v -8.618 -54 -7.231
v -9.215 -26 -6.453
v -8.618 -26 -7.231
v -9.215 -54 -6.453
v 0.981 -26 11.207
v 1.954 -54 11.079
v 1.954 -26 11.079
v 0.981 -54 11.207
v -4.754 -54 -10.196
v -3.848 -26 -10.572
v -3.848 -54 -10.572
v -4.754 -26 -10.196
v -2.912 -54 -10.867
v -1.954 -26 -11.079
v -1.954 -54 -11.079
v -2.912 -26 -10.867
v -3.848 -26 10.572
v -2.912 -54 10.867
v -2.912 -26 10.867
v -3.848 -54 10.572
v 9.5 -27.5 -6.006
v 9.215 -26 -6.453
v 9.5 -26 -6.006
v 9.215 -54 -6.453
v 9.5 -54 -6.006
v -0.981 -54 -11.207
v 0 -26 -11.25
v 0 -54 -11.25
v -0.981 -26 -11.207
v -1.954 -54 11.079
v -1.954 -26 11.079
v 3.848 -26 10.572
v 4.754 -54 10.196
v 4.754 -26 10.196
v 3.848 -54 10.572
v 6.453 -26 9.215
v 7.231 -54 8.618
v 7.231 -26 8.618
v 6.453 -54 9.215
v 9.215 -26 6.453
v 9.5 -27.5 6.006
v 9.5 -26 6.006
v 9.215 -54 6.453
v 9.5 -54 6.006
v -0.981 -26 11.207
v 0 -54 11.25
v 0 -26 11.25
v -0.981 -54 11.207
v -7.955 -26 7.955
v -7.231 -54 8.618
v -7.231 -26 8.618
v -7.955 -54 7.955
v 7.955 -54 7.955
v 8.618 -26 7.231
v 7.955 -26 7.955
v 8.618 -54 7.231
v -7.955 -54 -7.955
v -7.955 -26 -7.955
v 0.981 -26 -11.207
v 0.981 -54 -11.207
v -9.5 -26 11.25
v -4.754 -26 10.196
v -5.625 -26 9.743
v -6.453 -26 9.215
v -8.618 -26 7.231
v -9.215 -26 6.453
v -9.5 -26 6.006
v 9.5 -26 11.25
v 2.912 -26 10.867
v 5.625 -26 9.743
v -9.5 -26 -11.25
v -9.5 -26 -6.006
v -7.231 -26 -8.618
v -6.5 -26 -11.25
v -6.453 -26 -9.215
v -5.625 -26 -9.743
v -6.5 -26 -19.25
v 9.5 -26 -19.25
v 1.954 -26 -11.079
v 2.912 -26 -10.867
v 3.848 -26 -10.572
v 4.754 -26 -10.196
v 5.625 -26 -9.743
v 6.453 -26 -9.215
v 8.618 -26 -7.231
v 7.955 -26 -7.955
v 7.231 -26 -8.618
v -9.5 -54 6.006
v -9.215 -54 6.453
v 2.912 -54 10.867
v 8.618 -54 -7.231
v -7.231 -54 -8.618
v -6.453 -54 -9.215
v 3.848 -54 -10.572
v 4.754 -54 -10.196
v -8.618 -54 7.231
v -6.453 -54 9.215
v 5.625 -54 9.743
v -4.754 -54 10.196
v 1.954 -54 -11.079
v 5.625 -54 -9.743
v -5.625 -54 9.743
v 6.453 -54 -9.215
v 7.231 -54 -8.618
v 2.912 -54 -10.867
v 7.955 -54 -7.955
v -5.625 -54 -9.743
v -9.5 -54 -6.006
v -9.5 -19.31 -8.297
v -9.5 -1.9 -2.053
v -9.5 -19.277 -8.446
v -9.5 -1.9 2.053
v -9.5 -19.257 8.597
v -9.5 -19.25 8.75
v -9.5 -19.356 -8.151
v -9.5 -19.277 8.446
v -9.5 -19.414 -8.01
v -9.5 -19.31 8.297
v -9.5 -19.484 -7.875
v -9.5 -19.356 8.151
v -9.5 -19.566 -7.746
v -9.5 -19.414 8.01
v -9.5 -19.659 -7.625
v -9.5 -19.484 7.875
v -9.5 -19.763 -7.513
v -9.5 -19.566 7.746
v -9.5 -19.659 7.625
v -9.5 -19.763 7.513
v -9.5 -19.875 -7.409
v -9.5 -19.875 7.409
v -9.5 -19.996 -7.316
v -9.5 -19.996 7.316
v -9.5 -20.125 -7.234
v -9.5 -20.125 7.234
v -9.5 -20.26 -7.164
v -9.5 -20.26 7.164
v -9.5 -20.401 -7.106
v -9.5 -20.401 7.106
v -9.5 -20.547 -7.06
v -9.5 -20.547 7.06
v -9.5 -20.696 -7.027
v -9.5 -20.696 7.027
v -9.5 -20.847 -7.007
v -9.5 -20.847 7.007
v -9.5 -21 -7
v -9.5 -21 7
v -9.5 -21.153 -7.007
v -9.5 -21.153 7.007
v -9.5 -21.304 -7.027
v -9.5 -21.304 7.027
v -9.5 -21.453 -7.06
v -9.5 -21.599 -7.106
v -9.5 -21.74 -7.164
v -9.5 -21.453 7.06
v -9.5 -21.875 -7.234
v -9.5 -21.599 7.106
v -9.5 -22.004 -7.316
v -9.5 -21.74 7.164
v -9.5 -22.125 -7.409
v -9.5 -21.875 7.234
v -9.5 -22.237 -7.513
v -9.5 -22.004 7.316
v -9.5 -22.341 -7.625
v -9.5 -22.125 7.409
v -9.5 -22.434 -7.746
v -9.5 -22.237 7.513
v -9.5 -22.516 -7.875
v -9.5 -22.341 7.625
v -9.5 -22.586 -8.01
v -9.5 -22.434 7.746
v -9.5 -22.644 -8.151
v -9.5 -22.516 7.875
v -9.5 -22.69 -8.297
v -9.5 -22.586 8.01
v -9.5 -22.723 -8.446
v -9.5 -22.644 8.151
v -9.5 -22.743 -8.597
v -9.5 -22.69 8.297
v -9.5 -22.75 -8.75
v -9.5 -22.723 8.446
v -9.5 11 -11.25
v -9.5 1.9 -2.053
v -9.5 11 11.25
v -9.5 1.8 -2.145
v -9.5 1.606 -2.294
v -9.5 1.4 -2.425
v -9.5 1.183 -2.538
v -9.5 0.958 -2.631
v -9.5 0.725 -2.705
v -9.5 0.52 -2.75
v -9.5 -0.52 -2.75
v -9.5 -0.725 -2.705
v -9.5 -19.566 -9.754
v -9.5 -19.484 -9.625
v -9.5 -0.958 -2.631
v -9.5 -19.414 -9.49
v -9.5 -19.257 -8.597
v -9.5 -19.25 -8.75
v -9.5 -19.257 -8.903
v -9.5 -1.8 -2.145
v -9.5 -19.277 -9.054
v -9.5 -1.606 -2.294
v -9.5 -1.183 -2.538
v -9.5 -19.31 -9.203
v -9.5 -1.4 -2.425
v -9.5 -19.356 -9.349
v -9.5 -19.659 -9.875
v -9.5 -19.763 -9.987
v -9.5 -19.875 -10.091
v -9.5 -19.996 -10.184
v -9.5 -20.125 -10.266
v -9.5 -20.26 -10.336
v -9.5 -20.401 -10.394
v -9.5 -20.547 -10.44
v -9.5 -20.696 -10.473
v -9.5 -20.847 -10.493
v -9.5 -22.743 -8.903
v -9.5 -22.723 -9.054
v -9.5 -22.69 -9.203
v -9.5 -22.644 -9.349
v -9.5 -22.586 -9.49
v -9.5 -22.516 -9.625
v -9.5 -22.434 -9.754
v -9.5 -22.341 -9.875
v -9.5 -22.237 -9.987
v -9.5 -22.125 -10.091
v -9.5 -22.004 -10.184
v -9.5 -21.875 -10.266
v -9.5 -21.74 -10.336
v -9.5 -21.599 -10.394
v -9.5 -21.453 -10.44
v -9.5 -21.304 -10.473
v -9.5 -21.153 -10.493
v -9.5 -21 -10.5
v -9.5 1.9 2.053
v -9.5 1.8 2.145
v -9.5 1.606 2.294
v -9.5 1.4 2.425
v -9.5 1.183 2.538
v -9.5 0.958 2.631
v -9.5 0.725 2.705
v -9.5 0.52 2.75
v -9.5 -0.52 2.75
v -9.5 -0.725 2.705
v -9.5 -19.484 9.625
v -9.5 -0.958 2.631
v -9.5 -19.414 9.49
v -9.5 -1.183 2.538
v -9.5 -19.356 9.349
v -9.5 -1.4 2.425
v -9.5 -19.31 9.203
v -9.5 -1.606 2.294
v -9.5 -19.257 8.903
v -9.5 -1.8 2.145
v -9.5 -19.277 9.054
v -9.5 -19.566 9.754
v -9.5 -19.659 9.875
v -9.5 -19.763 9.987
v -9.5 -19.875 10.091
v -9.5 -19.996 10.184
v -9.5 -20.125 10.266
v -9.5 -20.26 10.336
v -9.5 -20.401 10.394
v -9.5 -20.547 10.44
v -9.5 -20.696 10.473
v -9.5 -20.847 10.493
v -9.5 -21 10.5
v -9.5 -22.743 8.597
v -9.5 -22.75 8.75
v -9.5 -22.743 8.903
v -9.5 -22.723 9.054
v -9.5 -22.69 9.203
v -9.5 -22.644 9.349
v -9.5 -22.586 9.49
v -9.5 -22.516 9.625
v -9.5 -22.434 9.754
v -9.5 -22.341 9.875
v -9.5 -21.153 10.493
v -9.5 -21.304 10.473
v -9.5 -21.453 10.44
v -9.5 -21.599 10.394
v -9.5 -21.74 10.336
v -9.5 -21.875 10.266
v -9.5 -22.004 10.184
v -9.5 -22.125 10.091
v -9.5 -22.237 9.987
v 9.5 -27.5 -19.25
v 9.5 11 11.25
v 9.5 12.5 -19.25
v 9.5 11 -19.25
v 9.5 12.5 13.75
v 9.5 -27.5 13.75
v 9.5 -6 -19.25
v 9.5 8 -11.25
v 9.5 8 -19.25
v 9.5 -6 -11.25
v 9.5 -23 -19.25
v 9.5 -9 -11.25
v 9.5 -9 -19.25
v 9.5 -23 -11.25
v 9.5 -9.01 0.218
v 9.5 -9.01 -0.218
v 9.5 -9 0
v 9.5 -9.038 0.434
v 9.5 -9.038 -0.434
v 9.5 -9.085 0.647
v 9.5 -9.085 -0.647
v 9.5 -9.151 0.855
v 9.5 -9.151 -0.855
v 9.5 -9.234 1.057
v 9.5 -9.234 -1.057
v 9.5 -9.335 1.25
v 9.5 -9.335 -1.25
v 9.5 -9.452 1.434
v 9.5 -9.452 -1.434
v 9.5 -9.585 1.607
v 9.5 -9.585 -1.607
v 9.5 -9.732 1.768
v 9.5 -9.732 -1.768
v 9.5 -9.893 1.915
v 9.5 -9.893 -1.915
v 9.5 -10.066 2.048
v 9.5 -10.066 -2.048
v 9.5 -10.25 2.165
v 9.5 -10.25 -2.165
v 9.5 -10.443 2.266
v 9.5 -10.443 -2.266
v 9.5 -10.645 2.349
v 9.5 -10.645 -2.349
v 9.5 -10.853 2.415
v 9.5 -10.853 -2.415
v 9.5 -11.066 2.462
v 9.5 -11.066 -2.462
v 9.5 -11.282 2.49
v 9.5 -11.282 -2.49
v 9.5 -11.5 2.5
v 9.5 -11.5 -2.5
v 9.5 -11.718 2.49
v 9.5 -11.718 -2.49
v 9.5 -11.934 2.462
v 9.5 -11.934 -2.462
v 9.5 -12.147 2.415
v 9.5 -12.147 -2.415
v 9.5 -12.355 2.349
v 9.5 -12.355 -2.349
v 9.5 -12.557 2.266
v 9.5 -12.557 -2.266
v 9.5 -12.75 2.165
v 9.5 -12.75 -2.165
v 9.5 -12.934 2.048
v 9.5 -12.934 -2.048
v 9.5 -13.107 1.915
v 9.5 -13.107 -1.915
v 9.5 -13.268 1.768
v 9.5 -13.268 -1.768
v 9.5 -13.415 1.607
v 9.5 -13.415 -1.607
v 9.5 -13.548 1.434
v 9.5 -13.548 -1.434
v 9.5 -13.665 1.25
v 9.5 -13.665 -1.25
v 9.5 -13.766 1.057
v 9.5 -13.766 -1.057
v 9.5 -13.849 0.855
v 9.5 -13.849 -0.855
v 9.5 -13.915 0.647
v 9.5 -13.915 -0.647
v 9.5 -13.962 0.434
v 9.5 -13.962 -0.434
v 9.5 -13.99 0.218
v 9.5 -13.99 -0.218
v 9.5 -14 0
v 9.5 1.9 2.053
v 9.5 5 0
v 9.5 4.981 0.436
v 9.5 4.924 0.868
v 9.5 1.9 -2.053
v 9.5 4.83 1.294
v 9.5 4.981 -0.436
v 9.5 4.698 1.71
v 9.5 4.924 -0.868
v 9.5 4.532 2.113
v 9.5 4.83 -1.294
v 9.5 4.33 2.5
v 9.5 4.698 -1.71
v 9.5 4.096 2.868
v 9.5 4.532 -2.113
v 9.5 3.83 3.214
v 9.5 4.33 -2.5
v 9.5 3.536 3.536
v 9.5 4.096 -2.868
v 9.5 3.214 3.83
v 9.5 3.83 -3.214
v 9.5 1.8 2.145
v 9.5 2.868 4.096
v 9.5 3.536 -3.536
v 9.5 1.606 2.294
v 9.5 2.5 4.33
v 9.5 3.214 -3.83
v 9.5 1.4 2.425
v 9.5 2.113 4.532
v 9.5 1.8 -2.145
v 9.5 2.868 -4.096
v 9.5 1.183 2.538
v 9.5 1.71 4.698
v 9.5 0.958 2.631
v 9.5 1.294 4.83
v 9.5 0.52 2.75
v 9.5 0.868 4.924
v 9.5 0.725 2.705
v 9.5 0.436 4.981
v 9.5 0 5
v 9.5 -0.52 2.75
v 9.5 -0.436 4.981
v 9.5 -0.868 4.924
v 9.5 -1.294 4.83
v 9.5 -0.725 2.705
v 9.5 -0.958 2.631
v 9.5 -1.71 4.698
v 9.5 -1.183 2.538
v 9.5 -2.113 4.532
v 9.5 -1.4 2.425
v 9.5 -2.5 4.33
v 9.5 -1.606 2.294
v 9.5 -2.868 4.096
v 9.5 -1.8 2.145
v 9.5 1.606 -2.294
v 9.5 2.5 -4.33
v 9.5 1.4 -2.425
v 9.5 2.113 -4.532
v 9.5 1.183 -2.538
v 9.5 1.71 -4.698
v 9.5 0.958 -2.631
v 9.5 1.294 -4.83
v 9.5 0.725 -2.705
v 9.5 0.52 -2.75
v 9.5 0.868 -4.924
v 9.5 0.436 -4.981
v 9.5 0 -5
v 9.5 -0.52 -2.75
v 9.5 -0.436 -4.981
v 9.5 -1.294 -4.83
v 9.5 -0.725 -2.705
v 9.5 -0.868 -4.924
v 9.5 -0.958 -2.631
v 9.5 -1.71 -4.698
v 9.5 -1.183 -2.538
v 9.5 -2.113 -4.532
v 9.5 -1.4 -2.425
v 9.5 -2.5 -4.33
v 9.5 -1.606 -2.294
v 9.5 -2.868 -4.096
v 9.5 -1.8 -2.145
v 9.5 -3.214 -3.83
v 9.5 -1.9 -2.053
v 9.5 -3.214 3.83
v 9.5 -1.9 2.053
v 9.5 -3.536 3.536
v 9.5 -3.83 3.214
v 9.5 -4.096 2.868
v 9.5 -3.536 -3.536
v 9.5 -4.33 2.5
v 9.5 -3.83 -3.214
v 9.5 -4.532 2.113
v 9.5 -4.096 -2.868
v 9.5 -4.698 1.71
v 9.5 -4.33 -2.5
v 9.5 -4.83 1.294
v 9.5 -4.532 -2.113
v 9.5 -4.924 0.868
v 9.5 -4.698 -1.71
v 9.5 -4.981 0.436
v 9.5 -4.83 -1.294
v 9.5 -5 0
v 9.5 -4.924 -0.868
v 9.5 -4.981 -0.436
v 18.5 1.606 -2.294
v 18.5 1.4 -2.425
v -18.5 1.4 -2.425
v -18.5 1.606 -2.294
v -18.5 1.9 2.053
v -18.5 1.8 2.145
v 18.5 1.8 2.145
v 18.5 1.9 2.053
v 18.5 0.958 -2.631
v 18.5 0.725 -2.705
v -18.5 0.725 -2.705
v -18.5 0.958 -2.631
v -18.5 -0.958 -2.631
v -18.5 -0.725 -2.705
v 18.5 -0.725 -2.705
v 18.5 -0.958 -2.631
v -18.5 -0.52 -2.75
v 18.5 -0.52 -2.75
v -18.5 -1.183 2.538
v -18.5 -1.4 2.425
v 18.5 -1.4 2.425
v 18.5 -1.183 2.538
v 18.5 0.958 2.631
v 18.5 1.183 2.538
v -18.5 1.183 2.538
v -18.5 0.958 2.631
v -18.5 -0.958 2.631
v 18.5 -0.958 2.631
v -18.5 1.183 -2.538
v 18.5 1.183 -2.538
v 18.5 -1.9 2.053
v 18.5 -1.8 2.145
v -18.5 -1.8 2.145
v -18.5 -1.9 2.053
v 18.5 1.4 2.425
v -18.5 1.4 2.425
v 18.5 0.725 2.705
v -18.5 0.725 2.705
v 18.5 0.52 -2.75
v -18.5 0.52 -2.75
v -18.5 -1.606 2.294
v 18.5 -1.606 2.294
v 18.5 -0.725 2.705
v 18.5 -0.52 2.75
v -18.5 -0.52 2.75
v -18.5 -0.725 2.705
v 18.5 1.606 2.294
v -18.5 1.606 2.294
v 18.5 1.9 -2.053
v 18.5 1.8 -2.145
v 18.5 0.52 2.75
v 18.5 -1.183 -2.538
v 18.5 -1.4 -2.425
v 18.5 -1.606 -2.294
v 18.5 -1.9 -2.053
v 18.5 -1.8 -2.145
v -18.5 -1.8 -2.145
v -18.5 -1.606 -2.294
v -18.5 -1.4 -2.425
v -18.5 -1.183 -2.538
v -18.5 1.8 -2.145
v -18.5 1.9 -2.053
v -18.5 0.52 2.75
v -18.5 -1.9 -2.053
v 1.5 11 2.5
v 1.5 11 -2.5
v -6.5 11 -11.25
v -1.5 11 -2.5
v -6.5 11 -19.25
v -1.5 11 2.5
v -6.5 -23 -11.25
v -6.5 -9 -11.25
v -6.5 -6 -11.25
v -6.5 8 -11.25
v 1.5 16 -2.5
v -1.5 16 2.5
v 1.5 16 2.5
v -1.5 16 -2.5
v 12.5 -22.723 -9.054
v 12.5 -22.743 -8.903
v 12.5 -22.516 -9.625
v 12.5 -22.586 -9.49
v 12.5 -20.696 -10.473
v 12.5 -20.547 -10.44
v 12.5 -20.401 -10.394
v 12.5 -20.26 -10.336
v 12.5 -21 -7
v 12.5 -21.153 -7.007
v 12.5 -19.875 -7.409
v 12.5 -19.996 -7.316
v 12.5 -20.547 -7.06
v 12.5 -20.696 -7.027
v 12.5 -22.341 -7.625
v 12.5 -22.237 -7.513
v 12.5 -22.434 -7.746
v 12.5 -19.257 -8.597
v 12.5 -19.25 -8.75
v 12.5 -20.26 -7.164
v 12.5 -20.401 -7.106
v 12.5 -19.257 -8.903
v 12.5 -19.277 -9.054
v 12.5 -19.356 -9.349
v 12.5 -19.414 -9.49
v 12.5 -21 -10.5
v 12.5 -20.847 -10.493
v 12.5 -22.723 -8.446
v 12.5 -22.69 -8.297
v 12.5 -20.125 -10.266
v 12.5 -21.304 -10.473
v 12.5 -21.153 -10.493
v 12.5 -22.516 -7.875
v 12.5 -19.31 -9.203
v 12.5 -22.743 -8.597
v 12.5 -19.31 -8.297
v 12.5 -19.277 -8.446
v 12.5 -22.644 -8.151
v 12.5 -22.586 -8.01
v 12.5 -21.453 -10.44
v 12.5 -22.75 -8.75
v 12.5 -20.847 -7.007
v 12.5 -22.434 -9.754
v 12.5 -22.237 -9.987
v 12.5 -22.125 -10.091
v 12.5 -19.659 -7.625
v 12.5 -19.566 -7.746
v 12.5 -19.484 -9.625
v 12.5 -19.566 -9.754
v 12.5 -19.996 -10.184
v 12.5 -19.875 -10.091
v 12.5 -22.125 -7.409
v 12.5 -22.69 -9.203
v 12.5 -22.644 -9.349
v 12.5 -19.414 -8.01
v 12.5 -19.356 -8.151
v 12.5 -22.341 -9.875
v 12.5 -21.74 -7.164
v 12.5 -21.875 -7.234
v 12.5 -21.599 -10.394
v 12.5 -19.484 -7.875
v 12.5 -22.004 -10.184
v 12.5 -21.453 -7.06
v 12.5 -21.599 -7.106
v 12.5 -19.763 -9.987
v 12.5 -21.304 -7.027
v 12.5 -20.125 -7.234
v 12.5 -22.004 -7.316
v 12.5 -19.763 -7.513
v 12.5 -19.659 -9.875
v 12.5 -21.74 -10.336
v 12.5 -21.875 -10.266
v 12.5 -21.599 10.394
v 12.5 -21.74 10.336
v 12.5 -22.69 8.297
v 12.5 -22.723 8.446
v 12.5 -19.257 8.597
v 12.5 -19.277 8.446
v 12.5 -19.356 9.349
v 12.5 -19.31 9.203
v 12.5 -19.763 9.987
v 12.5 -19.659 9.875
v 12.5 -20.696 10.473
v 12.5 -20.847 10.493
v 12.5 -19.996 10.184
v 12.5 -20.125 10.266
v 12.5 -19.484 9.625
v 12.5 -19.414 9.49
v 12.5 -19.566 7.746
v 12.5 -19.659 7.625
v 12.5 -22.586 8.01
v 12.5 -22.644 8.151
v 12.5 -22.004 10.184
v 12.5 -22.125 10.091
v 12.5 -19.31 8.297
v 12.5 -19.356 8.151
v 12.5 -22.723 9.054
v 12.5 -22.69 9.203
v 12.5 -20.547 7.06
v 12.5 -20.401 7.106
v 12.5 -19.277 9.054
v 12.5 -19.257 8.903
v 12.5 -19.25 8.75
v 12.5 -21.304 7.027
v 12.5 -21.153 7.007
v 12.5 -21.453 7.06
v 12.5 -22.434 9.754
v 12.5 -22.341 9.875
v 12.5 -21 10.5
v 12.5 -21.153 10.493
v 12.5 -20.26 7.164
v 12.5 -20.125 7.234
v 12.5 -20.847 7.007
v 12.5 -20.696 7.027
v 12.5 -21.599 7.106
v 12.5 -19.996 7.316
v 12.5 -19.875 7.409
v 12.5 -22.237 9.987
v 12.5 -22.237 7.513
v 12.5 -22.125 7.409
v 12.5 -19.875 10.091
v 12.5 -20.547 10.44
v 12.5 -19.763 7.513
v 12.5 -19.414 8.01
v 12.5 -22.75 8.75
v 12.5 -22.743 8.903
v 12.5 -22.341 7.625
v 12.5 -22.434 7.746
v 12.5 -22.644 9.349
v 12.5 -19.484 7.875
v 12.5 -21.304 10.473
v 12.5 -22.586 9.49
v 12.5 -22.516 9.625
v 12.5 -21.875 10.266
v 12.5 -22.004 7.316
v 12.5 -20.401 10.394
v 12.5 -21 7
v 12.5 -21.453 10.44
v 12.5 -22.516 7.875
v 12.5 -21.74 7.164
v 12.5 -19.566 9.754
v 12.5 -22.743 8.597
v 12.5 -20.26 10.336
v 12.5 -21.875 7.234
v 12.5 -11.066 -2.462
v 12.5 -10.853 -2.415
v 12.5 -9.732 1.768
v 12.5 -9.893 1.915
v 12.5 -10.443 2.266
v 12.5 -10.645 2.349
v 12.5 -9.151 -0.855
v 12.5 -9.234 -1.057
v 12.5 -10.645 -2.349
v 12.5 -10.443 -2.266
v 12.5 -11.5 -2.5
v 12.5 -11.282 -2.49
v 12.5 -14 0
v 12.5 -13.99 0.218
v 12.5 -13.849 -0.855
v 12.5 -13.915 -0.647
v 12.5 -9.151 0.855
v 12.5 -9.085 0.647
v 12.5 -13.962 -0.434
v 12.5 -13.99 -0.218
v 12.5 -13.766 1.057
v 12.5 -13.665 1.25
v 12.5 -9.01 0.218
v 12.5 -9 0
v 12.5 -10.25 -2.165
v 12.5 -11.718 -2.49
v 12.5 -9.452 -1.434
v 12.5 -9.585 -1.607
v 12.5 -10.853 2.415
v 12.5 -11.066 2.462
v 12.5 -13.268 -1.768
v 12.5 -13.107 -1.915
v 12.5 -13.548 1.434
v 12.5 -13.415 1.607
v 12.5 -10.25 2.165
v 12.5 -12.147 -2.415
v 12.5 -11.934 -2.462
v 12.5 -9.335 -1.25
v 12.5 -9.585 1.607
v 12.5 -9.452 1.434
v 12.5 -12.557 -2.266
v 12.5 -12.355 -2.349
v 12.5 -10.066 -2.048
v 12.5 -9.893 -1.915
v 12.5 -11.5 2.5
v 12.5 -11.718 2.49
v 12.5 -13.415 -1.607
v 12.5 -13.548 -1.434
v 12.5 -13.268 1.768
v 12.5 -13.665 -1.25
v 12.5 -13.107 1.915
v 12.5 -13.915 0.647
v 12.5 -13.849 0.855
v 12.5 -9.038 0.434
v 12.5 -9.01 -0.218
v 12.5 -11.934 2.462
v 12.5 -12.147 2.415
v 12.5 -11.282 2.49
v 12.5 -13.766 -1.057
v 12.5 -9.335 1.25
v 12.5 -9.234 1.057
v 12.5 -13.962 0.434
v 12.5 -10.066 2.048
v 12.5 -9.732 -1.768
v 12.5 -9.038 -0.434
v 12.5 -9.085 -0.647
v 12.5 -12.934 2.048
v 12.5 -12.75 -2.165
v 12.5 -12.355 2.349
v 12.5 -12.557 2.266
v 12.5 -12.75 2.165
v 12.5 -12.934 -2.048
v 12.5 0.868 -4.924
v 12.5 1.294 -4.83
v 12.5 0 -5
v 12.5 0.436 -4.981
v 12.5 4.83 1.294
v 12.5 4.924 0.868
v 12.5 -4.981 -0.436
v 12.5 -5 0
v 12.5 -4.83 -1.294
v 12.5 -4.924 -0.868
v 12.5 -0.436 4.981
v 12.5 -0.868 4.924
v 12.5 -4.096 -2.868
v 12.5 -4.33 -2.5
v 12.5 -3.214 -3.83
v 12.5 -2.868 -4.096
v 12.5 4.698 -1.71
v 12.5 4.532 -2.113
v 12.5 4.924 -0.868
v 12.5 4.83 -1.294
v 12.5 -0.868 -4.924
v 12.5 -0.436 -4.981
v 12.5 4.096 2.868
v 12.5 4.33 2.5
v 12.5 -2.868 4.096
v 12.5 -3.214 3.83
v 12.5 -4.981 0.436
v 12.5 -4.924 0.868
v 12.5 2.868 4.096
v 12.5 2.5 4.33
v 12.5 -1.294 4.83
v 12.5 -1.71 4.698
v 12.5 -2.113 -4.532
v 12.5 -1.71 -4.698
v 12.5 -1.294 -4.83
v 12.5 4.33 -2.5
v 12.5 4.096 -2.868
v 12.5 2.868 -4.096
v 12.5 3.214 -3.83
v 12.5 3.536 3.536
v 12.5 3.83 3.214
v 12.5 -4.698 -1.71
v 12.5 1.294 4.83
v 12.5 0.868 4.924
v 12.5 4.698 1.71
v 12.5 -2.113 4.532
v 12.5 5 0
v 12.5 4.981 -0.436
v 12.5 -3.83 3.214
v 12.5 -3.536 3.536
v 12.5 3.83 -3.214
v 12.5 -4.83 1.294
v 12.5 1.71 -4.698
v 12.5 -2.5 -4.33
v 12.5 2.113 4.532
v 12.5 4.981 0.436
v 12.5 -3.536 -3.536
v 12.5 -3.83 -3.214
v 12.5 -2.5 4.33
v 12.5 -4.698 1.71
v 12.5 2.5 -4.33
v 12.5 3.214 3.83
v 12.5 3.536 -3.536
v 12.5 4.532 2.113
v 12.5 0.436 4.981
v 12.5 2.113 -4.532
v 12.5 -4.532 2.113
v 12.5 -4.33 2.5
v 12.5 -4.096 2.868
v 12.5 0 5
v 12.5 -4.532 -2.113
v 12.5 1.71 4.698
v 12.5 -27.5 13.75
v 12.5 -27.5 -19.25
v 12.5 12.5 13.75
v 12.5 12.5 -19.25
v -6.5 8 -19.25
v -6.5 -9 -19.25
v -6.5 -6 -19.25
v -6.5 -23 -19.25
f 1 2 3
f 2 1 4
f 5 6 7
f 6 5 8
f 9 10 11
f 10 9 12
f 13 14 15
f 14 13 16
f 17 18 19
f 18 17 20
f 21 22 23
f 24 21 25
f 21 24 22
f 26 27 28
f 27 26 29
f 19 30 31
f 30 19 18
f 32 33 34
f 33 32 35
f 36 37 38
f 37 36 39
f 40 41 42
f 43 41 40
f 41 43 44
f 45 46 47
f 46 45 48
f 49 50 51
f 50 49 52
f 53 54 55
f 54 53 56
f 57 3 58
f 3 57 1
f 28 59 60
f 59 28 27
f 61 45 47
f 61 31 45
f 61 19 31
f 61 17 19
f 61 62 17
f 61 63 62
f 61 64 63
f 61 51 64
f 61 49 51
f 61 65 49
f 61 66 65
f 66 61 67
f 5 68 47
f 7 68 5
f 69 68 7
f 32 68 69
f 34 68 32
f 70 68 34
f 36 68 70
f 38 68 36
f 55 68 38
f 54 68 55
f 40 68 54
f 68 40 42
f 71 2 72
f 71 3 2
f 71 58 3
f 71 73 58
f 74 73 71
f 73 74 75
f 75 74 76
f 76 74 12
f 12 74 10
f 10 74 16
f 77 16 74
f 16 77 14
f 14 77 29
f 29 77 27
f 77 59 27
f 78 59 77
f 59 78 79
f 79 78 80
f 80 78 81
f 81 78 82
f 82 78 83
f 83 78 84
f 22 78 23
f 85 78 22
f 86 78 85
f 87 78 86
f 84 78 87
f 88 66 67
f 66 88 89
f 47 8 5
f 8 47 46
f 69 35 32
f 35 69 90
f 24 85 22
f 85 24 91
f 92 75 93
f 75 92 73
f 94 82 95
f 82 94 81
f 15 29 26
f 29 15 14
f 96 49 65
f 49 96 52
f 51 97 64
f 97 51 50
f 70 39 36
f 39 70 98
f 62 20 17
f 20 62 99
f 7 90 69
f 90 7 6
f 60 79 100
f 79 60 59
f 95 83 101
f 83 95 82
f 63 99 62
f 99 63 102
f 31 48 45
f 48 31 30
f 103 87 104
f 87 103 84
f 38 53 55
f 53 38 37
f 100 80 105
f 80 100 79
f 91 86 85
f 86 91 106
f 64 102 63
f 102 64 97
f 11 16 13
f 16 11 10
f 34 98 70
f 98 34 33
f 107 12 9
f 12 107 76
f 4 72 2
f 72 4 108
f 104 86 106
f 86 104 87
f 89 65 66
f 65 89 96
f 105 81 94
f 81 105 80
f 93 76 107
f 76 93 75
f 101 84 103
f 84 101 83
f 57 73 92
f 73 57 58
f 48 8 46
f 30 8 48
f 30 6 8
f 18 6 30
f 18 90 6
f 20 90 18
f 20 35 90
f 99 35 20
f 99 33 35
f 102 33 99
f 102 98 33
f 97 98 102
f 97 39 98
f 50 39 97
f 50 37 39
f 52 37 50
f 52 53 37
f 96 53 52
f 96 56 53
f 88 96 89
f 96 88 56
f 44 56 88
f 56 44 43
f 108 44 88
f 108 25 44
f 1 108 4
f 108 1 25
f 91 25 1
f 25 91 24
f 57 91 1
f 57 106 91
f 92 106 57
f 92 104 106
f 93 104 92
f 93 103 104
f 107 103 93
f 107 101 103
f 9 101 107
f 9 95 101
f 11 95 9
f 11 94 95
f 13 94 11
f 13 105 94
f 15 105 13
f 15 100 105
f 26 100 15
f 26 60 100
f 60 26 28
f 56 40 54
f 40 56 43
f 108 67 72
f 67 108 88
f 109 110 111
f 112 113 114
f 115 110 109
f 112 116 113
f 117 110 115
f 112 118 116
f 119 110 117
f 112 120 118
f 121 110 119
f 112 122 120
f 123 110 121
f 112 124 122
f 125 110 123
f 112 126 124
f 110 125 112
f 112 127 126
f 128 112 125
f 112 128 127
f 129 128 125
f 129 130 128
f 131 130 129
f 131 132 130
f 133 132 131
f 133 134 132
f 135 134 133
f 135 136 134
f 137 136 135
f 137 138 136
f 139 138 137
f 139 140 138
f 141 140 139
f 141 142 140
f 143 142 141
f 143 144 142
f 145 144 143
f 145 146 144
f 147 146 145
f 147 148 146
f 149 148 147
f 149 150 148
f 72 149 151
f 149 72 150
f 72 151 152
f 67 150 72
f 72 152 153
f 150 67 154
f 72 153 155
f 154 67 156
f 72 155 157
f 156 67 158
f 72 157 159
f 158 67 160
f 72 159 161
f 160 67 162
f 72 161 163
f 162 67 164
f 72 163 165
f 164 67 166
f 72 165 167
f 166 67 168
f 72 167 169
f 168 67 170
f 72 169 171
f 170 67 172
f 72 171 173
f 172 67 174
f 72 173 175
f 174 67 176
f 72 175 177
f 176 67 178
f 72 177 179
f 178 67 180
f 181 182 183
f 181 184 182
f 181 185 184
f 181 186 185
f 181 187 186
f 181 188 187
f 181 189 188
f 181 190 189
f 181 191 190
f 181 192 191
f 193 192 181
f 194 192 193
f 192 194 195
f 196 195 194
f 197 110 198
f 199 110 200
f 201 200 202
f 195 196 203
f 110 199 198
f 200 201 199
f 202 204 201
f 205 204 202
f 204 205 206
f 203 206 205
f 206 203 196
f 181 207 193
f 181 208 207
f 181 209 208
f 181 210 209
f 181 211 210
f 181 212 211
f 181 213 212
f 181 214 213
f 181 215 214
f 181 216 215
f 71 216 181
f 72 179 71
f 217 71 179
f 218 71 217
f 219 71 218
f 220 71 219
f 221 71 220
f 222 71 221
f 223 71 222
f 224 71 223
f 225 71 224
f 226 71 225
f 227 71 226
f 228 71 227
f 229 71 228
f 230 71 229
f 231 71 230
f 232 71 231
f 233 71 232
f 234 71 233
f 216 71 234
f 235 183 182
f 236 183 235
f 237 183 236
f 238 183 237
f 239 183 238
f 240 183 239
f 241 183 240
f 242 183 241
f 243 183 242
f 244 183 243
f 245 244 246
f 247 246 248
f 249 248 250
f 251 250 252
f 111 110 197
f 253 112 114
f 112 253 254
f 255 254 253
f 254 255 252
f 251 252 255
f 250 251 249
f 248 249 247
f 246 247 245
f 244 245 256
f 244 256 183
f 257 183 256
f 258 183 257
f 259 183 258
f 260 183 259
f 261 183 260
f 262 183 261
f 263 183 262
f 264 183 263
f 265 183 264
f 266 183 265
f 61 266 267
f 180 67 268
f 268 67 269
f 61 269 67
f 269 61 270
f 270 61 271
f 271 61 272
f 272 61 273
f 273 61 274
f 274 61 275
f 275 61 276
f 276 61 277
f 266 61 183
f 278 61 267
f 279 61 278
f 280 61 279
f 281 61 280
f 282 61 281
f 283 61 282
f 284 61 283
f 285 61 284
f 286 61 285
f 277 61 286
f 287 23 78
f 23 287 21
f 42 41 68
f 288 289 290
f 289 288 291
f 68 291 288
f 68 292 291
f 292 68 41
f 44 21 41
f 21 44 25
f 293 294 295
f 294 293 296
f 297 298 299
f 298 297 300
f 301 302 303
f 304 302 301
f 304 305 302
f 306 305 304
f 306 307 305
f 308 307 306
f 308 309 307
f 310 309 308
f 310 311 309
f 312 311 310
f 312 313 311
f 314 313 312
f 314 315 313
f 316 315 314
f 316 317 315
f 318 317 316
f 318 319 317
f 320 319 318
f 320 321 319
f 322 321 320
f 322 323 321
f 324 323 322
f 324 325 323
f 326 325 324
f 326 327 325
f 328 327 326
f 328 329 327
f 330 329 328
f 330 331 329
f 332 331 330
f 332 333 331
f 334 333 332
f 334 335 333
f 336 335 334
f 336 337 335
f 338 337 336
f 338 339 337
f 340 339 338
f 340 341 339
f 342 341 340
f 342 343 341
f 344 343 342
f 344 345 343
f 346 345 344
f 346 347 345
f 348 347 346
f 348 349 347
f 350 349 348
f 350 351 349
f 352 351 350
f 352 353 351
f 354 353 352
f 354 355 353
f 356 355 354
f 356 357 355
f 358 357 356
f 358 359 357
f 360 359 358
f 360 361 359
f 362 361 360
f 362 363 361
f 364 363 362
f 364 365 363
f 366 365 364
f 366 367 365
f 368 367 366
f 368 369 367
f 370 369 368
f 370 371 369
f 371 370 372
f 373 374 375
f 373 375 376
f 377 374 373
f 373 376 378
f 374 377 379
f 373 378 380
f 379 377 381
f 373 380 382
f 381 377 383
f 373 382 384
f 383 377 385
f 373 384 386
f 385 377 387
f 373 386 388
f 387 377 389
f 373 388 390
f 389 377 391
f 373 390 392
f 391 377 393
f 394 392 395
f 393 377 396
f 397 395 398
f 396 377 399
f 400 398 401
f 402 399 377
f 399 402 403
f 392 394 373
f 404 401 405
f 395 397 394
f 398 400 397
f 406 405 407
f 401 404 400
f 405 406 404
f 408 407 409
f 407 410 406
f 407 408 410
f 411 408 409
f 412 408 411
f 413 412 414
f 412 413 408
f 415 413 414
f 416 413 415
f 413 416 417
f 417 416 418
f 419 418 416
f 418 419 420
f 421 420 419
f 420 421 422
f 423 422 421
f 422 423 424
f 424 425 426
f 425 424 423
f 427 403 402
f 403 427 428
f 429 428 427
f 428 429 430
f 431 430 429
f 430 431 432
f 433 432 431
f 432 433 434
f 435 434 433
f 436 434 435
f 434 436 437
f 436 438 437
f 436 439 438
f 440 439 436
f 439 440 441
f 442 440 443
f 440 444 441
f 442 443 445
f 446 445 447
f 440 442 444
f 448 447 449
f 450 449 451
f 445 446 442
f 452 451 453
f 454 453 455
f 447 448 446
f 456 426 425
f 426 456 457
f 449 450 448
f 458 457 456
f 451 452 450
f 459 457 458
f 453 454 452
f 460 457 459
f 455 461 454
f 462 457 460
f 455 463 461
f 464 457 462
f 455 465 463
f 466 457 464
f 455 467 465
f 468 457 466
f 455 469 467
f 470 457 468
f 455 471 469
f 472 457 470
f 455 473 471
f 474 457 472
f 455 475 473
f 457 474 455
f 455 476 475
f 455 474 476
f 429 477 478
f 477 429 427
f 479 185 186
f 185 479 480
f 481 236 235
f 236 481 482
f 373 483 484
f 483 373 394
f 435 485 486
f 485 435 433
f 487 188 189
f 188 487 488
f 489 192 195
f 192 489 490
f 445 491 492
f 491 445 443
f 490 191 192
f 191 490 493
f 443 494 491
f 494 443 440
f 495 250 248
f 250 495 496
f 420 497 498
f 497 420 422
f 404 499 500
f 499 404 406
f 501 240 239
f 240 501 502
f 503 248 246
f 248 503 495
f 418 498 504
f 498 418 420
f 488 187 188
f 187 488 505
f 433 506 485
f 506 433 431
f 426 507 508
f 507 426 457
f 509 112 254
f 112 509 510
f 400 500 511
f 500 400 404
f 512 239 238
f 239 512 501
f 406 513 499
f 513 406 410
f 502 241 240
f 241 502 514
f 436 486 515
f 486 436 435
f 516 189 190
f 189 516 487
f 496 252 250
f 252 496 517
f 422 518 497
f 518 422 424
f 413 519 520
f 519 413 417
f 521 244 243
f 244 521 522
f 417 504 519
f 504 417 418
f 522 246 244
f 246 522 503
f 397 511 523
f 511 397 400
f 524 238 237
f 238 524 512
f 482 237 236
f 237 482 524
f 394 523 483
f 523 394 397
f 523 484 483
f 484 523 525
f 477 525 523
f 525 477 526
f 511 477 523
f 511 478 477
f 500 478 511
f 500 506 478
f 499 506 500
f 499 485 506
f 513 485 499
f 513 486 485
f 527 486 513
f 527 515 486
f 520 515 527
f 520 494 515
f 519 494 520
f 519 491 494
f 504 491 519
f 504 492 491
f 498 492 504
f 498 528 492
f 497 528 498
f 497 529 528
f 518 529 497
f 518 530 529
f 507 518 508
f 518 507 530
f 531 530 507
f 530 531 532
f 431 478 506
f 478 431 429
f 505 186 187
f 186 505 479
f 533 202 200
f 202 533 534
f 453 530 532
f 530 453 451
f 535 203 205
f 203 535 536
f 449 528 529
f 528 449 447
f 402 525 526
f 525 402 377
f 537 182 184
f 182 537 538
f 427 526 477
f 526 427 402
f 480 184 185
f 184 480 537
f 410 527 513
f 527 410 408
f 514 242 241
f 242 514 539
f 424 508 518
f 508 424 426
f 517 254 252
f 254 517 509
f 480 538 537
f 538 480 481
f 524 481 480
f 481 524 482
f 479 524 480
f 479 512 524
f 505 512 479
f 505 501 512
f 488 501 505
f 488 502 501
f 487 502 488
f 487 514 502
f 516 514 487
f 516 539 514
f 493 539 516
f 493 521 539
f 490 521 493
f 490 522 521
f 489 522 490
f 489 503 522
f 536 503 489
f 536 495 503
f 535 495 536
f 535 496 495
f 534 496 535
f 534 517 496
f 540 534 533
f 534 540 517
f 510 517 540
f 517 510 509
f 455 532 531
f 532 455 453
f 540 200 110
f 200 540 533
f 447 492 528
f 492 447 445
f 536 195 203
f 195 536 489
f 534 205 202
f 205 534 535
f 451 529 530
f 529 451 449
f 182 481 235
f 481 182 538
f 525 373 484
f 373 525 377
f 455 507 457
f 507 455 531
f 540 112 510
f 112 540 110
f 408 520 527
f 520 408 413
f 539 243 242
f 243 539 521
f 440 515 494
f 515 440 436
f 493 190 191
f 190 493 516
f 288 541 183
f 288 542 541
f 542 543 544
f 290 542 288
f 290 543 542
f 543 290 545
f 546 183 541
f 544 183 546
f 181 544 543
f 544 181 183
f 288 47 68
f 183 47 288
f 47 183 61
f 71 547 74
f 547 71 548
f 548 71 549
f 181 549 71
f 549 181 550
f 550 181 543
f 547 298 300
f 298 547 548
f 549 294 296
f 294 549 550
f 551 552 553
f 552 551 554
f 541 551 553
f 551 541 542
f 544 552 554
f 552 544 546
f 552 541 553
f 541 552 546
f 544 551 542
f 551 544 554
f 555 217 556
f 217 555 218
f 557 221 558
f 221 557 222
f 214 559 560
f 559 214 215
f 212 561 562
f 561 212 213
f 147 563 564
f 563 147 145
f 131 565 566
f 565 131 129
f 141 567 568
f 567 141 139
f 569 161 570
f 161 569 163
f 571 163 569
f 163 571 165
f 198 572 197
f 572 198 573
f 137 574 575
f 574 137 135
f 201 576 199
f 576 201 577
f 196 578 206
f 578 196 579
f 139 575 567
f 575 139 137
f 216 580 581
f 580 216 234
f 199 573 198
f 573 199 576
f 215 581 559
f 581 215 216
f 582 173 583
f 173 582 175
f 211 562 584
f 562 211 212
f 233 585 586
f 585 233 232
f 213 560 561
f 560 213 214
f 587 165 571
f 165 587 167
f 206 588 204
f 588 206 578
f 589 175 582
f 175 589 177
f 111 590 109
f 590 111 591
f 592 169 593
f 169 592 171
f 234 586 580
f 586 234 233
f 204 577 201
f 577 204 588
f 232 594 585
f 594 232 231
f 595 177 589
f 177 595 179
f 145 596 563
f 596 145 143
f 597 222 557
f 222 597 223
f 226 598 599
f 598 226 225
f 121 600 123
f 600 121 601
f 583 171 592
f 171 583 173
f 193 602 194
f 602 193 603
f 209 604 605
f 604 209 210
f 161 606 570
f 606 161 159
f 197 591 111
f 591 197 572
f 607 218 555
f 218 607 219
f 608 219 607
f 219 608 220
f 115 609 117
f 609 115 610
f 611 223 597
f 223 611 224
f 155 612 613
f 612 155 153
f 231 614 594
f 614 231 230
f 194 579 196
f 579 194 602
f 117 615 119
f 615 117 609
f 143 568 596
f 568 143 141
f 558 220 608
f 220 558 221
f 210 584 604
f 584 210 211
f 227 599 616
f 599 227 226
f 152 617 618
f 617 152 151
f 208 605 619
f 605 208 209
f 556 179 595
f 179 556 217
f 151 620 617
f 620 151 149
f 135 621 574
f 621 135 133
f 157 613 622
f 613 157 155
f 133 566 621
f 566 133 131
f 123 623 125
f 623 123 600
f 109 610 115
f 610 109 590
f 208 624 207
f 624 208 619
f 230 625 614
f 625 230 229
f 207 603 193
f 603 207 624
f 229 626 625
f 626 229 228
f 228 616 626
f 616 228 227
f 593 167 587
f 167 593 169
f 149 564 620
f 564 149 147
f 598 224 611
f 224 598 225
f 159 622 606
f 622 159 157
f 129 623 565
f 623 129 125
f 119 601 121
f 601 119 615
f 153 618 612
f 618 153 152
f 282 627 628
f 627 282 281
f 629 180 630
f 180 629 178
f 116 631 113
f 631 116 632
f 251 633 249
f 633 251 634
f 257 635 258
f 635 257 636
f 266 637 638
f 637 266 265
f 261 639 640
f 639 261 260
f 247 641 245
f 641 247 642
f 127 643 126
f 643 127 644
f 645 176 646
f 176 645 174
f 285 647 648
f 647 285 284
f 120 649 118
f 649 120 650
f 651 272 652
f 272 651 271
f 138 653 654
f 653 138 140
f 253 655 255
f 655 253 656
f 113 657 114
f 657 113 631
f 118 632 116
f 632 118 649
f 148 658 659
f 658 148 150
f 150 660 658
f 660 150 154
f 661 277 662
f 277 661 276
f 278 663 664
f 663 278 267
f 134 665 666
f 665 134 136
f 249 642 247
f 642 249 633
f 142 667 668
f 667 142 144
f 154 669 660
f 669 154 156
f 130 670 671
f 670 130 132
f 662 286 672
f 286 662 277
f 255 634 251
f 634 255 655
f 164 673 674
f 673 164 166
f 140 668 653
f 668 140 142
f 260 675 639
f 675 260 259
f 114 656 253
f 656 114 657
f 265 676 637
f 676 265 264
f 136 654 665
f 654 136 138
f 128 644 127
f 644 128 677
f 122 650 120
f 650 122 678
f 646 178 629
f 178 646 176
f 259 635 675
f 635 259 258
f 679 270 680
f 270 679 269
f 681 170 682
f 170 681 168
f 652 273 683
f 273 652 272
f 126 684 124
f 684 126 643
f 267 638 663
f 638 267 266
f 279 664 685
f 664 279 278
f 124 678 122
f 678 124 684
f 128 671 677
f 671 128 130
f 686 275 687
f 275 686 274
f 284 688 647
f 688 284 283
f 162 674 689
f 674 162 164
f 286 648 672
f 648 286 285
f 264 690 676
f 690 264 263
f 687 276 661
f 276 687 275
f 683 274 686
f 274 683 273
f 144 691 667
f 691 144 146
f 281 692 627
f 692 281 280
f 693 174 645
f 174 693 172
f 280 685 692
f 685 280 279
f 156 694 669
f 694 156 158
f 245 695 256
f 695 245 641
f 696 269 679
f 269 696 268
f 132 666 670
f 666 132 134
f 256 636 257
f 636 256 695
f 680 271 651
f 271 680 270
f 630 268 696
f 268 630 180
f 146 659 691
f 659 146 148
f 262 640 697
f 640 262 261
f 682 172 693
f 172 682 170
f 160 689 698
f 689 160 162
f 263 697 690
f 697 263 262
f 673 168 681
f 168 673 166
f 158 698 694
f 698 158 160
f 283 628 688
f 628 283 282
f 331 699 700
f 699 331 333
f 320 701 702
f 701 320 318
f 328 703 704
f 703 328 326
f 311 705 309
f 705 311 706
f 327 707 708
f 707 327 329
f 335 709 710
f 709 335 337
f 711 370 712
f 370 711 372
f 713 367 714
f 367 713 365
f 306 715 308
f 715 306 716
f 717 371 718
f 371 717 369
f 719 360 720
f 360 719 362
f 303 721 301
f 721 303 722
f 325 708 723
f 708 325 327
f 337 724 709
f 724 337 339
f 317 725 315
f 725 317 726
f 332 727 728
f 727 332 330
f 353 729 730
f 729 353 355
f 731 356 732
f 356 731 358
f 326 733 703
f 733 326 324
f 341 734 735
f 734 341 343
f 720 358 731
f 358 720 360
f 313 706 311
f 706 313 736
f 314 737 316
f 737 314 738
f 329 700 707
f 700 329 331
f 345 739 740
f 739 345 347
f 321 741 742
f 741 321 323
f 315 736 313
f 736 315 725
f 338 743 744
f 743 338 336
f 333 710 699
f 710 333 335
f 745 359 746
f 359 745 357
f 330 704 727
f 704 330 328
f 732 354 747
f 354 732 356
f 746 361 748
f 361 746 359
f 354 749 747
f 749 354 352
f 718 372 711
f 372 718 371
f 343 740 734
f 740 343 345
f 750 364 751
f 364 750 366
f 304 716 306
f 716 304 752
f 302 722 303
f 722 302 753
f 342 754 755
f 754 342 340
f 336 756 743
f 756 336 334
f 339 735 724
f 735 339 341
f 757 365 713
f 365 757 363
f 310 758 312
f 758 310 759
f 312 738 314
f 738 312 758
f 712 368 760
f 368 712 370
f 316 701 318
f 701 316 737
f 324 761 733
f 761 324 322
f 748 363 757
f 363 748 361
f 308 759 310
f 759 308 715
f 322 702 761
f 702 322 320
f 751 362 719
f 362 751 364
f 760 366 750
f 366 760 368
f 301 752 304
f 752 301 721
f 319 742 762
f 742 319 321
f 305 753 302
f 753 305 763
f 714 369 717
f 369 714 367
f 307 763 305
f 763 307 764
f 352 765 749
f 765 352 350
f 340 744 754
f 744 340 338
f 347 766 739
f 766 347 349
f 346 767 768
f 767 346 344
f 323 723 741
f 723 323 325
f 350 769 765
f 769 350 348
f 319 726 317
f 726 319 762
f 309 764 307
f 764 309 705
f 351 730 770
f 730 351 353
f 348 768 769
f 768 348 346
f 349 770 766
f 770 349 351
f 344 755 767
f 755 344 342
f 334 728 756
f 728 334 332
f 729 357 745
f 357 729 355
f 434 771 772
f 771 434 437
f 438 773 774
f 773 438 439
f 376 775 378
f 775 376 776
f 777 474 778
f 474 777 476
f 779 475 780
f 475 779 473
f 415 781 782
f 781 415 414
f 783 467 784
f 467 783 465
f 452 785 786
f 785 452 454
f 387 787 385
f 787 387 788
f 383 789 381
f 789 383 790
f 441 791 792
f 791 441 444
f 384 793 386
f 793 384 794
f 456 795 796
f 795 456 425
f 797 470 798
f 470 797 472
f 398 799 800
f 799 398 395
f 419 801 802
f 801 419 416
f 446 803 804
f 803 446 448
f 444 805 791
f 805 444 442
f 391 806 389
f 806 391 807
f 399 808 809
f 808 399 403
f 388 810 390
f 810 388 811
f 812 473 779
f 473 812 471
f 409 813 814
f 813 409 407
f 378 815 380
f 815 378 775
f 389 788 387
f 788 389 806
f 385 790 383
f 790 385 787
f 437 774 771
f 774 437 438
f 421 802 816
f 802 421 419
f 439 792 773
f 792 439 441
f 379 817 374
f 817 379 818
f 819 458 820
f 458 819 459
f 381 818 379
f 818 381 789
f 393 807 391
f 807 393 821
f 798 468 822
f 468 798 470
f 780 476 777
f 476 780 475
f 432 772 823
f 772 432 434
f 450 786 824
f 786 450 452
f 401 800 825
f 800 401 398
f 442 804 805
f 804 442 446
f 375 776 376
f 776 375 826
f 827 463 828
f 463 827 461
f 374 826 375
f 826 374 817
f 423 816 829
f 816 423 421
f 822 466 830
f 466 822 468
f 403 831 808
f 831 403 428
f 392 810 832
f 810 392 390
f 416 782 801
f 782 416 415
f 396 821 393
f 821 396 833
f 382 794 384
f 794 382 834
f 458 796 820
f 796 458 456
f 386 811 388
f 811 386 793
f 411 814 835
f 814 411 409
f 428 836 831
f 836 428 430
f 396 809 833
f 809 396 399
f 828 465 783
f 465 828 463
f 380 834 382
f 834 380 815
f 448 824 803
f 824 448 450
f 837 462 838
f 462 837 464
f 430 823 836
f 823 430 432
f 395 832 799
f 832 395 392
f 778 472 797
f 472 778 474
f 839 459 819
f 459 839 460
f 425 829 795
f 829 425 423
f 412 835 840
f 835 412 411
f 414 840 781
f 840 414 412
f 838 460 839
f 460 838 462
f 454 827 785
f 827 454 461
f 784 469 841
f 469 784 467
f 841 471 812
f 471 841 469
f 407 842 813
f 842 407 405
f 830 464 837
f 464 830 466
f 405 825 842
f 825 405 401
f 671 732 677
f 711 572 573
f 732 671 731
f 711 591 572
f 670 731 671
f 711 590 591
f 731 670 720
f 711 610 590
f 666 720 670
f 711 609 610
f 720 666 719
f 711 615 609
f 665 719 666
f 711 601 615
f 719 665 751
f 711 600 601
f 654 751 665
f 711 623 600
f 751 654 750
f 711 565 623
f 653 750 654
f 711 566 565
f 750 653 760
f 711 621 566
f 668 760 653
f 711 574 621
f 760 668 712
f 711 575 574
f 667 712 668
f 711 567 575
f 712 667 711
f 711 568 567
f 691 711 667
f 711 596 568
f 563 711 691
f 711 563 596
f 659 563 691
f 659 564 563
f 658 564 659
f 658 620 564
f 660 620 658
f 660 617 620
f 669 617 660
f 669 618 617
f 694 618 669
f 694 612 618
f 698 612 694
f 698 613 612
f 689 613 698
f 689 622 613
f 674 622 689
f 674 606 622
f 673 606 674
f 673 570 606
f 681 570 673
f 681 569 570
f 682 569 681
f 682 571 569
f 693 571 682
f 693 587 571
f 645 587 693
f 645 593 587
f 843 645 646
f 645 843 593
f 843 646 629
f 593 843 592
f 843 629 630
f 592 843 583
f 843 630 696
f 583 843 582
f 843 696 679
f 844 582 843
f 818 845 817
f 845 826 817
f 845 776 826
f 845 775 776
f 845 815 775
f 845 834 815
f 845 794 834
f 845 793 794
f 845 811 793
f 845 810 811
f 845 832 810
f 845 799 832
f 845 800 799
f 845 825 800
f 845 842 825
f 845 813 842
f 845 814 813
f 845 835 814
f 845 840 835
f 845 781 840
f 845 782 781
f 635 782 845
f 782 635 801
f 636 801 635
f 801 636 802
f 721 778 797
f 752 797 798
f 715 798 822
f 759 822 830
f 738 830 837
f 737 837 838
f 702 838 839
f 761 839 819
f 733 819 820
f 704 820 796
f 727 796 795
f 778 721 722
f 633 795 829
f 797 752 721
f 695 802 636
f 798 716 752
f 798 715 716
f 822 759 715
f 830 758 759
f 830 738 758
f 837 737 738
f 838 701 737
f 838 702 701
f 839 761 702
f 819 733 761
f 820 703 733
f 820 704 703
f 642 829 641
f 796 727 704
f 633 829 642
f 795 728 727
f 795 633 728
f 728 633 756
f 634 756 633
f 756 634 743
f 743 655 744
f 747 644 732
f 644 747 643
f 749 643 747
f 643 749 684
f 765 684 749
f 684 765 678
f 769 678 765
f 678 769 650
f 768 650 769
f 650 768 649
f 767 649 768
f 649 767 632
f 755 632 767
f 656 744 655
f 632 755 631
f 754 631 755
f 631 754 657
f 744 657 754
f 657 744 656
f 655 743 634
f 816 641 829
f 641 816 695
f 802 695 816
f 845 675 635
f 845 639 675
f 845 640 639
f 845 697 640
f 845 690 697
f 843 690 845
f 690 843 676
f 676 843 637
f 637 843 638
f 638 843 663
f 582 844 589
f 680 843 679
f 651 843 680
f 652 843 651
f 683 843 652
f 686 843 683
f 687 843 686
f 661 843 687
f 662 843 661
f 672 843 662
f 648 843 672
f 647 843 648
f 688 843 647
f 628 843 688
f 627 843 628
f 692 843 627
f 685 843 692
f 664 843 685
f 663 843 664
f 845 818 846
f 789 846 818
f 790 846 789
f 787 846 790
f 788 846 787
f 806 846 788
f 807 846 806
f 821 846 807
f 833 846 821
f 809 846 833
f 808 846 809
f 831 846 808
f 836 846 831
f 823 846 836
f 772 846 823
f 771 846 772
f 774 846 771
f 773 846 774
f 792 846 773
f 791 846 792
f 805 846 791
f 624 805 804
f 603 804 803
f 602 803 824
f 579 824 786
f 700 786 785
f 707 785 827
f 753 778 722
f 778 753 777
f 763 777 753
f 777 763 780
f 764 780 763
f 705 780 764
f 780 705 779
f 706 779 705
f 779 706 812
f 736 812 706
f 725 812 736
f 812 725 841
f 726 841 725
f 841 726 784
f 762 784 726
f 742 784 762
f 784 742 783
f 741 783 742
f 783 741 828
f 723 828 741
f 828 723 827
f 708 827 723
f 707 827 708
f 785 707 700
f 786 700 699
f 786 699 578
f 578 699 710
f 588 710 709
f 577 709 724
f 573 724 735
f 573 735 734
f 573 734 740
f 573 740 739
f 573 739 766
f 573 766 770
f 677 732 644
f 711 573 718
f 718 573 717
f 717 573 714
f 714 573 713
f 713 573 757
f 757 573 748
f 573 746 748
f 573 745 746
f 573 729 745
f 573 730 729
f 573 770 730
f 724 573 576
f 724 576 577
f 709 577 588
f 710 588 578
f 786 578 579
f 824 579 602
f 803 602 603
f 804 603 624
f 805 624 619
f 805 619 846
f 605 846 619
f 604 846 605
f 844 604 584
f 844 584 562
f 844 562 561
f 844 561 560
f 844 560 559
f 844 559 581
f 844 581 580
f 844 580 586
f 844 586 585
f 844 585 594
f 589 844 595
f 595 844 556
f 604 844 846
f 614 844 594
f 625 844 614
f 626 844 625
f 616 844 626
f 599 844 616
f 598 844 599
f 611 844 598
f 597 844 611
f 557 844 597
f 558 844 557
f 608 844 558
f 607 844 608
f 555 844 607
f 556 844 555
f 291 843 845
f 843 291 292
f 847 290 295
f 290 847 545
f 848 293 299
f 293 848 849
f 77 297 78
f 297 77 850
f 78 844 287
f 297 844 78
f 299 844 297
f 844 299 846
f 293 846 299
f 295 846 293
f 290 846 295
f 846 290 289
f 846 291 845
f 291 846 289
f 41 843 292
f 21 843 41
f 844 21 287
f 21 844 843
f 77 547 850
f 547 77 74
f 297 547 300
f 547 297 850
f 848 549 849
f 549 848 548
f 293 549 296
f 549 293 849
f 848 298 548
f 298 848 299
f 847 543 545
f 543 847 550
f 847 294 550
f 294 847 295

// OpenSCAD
$fn = 72;

motor();

translate([11,0,0])
motor_mount();

//translate([-11,0,0])
//motor_mount();

module motor()
{
    translate([0,-7.5,0])
    rotate([90,0,90])
    difference()
    {
        union()
        {
            color("yellow")
            cube([37, 22.5, 19], center=true);
            
            color("yellow")
            translate([18.5 + 2.5,0,0])
            cube([5, 5, 3], center=true);
            
            color("grey")
            translate([-(18.5 + 14), 0, ])
            rotate([0,90,0])
            intersection()
            {
                cylinder(d=22.5, h=28, center=true);
                cube([19,22.5, 28], center=true);
            }
            
            color("white")
            translate([18.5 - 11,0,0])
            shaft();
        }
        
        rotate([0,90,-90])
        mounting_holes();
    }
}

module shaft(keyed=true)
{
    intersection()
    {
        cylinder(d=5.6, h=37, center=true);
        
        if (keyed)
        {
            cube([3.8, 5.5, 37], center=true);
        }
    }
}

module mounting_holes()
{
    rotate([90,0,90])
    union()
    {
        translate([-(18.5 - 5), 17.5/2, 0])
        cylinder(d=3.5, h=19*2, center=true);
        
        translate([-(18.5 - 5), -17.5/2, 0])
        cylinder(d=3.5, h=19*2, center=true);
    }
}

module motor_mount(thickness=3, supports=true)
{
    mount_height = 8;
    
    translate([0,-7.5,0])
    
    union()
    {
        // Mounting for the motor
        difference()
        {
            translate([0,0,1.25 - mount_height/2])
            cube([thickness, 40, mount_height + 22.5 + 2.5], center=true);
            
            union()
            {
                mounting_holes();
                
                // Mounting nub
                translate([0, 18.5 - 11 - 11.5, 0])
                rotate([0,90,0])
                cylinder(d=5, h=37, center=true);
                
                // Motor Shaft
                translate([0, 18.5 - 11,0])
                rotate([0,90,0])
                cylinder(d=10, h=37, center=true);
            }
        }
        
        // Support for the motor
        if (supports)
        {
            union()
            {
                for (y_offset = [-17, 0, 17])
                {
                    translate([-9.5, y_offset, -(mount_height/2 + 22.5/2)])
                    cube([16,3,mount_height], center=true);
                }
            }
        }
    }
}
